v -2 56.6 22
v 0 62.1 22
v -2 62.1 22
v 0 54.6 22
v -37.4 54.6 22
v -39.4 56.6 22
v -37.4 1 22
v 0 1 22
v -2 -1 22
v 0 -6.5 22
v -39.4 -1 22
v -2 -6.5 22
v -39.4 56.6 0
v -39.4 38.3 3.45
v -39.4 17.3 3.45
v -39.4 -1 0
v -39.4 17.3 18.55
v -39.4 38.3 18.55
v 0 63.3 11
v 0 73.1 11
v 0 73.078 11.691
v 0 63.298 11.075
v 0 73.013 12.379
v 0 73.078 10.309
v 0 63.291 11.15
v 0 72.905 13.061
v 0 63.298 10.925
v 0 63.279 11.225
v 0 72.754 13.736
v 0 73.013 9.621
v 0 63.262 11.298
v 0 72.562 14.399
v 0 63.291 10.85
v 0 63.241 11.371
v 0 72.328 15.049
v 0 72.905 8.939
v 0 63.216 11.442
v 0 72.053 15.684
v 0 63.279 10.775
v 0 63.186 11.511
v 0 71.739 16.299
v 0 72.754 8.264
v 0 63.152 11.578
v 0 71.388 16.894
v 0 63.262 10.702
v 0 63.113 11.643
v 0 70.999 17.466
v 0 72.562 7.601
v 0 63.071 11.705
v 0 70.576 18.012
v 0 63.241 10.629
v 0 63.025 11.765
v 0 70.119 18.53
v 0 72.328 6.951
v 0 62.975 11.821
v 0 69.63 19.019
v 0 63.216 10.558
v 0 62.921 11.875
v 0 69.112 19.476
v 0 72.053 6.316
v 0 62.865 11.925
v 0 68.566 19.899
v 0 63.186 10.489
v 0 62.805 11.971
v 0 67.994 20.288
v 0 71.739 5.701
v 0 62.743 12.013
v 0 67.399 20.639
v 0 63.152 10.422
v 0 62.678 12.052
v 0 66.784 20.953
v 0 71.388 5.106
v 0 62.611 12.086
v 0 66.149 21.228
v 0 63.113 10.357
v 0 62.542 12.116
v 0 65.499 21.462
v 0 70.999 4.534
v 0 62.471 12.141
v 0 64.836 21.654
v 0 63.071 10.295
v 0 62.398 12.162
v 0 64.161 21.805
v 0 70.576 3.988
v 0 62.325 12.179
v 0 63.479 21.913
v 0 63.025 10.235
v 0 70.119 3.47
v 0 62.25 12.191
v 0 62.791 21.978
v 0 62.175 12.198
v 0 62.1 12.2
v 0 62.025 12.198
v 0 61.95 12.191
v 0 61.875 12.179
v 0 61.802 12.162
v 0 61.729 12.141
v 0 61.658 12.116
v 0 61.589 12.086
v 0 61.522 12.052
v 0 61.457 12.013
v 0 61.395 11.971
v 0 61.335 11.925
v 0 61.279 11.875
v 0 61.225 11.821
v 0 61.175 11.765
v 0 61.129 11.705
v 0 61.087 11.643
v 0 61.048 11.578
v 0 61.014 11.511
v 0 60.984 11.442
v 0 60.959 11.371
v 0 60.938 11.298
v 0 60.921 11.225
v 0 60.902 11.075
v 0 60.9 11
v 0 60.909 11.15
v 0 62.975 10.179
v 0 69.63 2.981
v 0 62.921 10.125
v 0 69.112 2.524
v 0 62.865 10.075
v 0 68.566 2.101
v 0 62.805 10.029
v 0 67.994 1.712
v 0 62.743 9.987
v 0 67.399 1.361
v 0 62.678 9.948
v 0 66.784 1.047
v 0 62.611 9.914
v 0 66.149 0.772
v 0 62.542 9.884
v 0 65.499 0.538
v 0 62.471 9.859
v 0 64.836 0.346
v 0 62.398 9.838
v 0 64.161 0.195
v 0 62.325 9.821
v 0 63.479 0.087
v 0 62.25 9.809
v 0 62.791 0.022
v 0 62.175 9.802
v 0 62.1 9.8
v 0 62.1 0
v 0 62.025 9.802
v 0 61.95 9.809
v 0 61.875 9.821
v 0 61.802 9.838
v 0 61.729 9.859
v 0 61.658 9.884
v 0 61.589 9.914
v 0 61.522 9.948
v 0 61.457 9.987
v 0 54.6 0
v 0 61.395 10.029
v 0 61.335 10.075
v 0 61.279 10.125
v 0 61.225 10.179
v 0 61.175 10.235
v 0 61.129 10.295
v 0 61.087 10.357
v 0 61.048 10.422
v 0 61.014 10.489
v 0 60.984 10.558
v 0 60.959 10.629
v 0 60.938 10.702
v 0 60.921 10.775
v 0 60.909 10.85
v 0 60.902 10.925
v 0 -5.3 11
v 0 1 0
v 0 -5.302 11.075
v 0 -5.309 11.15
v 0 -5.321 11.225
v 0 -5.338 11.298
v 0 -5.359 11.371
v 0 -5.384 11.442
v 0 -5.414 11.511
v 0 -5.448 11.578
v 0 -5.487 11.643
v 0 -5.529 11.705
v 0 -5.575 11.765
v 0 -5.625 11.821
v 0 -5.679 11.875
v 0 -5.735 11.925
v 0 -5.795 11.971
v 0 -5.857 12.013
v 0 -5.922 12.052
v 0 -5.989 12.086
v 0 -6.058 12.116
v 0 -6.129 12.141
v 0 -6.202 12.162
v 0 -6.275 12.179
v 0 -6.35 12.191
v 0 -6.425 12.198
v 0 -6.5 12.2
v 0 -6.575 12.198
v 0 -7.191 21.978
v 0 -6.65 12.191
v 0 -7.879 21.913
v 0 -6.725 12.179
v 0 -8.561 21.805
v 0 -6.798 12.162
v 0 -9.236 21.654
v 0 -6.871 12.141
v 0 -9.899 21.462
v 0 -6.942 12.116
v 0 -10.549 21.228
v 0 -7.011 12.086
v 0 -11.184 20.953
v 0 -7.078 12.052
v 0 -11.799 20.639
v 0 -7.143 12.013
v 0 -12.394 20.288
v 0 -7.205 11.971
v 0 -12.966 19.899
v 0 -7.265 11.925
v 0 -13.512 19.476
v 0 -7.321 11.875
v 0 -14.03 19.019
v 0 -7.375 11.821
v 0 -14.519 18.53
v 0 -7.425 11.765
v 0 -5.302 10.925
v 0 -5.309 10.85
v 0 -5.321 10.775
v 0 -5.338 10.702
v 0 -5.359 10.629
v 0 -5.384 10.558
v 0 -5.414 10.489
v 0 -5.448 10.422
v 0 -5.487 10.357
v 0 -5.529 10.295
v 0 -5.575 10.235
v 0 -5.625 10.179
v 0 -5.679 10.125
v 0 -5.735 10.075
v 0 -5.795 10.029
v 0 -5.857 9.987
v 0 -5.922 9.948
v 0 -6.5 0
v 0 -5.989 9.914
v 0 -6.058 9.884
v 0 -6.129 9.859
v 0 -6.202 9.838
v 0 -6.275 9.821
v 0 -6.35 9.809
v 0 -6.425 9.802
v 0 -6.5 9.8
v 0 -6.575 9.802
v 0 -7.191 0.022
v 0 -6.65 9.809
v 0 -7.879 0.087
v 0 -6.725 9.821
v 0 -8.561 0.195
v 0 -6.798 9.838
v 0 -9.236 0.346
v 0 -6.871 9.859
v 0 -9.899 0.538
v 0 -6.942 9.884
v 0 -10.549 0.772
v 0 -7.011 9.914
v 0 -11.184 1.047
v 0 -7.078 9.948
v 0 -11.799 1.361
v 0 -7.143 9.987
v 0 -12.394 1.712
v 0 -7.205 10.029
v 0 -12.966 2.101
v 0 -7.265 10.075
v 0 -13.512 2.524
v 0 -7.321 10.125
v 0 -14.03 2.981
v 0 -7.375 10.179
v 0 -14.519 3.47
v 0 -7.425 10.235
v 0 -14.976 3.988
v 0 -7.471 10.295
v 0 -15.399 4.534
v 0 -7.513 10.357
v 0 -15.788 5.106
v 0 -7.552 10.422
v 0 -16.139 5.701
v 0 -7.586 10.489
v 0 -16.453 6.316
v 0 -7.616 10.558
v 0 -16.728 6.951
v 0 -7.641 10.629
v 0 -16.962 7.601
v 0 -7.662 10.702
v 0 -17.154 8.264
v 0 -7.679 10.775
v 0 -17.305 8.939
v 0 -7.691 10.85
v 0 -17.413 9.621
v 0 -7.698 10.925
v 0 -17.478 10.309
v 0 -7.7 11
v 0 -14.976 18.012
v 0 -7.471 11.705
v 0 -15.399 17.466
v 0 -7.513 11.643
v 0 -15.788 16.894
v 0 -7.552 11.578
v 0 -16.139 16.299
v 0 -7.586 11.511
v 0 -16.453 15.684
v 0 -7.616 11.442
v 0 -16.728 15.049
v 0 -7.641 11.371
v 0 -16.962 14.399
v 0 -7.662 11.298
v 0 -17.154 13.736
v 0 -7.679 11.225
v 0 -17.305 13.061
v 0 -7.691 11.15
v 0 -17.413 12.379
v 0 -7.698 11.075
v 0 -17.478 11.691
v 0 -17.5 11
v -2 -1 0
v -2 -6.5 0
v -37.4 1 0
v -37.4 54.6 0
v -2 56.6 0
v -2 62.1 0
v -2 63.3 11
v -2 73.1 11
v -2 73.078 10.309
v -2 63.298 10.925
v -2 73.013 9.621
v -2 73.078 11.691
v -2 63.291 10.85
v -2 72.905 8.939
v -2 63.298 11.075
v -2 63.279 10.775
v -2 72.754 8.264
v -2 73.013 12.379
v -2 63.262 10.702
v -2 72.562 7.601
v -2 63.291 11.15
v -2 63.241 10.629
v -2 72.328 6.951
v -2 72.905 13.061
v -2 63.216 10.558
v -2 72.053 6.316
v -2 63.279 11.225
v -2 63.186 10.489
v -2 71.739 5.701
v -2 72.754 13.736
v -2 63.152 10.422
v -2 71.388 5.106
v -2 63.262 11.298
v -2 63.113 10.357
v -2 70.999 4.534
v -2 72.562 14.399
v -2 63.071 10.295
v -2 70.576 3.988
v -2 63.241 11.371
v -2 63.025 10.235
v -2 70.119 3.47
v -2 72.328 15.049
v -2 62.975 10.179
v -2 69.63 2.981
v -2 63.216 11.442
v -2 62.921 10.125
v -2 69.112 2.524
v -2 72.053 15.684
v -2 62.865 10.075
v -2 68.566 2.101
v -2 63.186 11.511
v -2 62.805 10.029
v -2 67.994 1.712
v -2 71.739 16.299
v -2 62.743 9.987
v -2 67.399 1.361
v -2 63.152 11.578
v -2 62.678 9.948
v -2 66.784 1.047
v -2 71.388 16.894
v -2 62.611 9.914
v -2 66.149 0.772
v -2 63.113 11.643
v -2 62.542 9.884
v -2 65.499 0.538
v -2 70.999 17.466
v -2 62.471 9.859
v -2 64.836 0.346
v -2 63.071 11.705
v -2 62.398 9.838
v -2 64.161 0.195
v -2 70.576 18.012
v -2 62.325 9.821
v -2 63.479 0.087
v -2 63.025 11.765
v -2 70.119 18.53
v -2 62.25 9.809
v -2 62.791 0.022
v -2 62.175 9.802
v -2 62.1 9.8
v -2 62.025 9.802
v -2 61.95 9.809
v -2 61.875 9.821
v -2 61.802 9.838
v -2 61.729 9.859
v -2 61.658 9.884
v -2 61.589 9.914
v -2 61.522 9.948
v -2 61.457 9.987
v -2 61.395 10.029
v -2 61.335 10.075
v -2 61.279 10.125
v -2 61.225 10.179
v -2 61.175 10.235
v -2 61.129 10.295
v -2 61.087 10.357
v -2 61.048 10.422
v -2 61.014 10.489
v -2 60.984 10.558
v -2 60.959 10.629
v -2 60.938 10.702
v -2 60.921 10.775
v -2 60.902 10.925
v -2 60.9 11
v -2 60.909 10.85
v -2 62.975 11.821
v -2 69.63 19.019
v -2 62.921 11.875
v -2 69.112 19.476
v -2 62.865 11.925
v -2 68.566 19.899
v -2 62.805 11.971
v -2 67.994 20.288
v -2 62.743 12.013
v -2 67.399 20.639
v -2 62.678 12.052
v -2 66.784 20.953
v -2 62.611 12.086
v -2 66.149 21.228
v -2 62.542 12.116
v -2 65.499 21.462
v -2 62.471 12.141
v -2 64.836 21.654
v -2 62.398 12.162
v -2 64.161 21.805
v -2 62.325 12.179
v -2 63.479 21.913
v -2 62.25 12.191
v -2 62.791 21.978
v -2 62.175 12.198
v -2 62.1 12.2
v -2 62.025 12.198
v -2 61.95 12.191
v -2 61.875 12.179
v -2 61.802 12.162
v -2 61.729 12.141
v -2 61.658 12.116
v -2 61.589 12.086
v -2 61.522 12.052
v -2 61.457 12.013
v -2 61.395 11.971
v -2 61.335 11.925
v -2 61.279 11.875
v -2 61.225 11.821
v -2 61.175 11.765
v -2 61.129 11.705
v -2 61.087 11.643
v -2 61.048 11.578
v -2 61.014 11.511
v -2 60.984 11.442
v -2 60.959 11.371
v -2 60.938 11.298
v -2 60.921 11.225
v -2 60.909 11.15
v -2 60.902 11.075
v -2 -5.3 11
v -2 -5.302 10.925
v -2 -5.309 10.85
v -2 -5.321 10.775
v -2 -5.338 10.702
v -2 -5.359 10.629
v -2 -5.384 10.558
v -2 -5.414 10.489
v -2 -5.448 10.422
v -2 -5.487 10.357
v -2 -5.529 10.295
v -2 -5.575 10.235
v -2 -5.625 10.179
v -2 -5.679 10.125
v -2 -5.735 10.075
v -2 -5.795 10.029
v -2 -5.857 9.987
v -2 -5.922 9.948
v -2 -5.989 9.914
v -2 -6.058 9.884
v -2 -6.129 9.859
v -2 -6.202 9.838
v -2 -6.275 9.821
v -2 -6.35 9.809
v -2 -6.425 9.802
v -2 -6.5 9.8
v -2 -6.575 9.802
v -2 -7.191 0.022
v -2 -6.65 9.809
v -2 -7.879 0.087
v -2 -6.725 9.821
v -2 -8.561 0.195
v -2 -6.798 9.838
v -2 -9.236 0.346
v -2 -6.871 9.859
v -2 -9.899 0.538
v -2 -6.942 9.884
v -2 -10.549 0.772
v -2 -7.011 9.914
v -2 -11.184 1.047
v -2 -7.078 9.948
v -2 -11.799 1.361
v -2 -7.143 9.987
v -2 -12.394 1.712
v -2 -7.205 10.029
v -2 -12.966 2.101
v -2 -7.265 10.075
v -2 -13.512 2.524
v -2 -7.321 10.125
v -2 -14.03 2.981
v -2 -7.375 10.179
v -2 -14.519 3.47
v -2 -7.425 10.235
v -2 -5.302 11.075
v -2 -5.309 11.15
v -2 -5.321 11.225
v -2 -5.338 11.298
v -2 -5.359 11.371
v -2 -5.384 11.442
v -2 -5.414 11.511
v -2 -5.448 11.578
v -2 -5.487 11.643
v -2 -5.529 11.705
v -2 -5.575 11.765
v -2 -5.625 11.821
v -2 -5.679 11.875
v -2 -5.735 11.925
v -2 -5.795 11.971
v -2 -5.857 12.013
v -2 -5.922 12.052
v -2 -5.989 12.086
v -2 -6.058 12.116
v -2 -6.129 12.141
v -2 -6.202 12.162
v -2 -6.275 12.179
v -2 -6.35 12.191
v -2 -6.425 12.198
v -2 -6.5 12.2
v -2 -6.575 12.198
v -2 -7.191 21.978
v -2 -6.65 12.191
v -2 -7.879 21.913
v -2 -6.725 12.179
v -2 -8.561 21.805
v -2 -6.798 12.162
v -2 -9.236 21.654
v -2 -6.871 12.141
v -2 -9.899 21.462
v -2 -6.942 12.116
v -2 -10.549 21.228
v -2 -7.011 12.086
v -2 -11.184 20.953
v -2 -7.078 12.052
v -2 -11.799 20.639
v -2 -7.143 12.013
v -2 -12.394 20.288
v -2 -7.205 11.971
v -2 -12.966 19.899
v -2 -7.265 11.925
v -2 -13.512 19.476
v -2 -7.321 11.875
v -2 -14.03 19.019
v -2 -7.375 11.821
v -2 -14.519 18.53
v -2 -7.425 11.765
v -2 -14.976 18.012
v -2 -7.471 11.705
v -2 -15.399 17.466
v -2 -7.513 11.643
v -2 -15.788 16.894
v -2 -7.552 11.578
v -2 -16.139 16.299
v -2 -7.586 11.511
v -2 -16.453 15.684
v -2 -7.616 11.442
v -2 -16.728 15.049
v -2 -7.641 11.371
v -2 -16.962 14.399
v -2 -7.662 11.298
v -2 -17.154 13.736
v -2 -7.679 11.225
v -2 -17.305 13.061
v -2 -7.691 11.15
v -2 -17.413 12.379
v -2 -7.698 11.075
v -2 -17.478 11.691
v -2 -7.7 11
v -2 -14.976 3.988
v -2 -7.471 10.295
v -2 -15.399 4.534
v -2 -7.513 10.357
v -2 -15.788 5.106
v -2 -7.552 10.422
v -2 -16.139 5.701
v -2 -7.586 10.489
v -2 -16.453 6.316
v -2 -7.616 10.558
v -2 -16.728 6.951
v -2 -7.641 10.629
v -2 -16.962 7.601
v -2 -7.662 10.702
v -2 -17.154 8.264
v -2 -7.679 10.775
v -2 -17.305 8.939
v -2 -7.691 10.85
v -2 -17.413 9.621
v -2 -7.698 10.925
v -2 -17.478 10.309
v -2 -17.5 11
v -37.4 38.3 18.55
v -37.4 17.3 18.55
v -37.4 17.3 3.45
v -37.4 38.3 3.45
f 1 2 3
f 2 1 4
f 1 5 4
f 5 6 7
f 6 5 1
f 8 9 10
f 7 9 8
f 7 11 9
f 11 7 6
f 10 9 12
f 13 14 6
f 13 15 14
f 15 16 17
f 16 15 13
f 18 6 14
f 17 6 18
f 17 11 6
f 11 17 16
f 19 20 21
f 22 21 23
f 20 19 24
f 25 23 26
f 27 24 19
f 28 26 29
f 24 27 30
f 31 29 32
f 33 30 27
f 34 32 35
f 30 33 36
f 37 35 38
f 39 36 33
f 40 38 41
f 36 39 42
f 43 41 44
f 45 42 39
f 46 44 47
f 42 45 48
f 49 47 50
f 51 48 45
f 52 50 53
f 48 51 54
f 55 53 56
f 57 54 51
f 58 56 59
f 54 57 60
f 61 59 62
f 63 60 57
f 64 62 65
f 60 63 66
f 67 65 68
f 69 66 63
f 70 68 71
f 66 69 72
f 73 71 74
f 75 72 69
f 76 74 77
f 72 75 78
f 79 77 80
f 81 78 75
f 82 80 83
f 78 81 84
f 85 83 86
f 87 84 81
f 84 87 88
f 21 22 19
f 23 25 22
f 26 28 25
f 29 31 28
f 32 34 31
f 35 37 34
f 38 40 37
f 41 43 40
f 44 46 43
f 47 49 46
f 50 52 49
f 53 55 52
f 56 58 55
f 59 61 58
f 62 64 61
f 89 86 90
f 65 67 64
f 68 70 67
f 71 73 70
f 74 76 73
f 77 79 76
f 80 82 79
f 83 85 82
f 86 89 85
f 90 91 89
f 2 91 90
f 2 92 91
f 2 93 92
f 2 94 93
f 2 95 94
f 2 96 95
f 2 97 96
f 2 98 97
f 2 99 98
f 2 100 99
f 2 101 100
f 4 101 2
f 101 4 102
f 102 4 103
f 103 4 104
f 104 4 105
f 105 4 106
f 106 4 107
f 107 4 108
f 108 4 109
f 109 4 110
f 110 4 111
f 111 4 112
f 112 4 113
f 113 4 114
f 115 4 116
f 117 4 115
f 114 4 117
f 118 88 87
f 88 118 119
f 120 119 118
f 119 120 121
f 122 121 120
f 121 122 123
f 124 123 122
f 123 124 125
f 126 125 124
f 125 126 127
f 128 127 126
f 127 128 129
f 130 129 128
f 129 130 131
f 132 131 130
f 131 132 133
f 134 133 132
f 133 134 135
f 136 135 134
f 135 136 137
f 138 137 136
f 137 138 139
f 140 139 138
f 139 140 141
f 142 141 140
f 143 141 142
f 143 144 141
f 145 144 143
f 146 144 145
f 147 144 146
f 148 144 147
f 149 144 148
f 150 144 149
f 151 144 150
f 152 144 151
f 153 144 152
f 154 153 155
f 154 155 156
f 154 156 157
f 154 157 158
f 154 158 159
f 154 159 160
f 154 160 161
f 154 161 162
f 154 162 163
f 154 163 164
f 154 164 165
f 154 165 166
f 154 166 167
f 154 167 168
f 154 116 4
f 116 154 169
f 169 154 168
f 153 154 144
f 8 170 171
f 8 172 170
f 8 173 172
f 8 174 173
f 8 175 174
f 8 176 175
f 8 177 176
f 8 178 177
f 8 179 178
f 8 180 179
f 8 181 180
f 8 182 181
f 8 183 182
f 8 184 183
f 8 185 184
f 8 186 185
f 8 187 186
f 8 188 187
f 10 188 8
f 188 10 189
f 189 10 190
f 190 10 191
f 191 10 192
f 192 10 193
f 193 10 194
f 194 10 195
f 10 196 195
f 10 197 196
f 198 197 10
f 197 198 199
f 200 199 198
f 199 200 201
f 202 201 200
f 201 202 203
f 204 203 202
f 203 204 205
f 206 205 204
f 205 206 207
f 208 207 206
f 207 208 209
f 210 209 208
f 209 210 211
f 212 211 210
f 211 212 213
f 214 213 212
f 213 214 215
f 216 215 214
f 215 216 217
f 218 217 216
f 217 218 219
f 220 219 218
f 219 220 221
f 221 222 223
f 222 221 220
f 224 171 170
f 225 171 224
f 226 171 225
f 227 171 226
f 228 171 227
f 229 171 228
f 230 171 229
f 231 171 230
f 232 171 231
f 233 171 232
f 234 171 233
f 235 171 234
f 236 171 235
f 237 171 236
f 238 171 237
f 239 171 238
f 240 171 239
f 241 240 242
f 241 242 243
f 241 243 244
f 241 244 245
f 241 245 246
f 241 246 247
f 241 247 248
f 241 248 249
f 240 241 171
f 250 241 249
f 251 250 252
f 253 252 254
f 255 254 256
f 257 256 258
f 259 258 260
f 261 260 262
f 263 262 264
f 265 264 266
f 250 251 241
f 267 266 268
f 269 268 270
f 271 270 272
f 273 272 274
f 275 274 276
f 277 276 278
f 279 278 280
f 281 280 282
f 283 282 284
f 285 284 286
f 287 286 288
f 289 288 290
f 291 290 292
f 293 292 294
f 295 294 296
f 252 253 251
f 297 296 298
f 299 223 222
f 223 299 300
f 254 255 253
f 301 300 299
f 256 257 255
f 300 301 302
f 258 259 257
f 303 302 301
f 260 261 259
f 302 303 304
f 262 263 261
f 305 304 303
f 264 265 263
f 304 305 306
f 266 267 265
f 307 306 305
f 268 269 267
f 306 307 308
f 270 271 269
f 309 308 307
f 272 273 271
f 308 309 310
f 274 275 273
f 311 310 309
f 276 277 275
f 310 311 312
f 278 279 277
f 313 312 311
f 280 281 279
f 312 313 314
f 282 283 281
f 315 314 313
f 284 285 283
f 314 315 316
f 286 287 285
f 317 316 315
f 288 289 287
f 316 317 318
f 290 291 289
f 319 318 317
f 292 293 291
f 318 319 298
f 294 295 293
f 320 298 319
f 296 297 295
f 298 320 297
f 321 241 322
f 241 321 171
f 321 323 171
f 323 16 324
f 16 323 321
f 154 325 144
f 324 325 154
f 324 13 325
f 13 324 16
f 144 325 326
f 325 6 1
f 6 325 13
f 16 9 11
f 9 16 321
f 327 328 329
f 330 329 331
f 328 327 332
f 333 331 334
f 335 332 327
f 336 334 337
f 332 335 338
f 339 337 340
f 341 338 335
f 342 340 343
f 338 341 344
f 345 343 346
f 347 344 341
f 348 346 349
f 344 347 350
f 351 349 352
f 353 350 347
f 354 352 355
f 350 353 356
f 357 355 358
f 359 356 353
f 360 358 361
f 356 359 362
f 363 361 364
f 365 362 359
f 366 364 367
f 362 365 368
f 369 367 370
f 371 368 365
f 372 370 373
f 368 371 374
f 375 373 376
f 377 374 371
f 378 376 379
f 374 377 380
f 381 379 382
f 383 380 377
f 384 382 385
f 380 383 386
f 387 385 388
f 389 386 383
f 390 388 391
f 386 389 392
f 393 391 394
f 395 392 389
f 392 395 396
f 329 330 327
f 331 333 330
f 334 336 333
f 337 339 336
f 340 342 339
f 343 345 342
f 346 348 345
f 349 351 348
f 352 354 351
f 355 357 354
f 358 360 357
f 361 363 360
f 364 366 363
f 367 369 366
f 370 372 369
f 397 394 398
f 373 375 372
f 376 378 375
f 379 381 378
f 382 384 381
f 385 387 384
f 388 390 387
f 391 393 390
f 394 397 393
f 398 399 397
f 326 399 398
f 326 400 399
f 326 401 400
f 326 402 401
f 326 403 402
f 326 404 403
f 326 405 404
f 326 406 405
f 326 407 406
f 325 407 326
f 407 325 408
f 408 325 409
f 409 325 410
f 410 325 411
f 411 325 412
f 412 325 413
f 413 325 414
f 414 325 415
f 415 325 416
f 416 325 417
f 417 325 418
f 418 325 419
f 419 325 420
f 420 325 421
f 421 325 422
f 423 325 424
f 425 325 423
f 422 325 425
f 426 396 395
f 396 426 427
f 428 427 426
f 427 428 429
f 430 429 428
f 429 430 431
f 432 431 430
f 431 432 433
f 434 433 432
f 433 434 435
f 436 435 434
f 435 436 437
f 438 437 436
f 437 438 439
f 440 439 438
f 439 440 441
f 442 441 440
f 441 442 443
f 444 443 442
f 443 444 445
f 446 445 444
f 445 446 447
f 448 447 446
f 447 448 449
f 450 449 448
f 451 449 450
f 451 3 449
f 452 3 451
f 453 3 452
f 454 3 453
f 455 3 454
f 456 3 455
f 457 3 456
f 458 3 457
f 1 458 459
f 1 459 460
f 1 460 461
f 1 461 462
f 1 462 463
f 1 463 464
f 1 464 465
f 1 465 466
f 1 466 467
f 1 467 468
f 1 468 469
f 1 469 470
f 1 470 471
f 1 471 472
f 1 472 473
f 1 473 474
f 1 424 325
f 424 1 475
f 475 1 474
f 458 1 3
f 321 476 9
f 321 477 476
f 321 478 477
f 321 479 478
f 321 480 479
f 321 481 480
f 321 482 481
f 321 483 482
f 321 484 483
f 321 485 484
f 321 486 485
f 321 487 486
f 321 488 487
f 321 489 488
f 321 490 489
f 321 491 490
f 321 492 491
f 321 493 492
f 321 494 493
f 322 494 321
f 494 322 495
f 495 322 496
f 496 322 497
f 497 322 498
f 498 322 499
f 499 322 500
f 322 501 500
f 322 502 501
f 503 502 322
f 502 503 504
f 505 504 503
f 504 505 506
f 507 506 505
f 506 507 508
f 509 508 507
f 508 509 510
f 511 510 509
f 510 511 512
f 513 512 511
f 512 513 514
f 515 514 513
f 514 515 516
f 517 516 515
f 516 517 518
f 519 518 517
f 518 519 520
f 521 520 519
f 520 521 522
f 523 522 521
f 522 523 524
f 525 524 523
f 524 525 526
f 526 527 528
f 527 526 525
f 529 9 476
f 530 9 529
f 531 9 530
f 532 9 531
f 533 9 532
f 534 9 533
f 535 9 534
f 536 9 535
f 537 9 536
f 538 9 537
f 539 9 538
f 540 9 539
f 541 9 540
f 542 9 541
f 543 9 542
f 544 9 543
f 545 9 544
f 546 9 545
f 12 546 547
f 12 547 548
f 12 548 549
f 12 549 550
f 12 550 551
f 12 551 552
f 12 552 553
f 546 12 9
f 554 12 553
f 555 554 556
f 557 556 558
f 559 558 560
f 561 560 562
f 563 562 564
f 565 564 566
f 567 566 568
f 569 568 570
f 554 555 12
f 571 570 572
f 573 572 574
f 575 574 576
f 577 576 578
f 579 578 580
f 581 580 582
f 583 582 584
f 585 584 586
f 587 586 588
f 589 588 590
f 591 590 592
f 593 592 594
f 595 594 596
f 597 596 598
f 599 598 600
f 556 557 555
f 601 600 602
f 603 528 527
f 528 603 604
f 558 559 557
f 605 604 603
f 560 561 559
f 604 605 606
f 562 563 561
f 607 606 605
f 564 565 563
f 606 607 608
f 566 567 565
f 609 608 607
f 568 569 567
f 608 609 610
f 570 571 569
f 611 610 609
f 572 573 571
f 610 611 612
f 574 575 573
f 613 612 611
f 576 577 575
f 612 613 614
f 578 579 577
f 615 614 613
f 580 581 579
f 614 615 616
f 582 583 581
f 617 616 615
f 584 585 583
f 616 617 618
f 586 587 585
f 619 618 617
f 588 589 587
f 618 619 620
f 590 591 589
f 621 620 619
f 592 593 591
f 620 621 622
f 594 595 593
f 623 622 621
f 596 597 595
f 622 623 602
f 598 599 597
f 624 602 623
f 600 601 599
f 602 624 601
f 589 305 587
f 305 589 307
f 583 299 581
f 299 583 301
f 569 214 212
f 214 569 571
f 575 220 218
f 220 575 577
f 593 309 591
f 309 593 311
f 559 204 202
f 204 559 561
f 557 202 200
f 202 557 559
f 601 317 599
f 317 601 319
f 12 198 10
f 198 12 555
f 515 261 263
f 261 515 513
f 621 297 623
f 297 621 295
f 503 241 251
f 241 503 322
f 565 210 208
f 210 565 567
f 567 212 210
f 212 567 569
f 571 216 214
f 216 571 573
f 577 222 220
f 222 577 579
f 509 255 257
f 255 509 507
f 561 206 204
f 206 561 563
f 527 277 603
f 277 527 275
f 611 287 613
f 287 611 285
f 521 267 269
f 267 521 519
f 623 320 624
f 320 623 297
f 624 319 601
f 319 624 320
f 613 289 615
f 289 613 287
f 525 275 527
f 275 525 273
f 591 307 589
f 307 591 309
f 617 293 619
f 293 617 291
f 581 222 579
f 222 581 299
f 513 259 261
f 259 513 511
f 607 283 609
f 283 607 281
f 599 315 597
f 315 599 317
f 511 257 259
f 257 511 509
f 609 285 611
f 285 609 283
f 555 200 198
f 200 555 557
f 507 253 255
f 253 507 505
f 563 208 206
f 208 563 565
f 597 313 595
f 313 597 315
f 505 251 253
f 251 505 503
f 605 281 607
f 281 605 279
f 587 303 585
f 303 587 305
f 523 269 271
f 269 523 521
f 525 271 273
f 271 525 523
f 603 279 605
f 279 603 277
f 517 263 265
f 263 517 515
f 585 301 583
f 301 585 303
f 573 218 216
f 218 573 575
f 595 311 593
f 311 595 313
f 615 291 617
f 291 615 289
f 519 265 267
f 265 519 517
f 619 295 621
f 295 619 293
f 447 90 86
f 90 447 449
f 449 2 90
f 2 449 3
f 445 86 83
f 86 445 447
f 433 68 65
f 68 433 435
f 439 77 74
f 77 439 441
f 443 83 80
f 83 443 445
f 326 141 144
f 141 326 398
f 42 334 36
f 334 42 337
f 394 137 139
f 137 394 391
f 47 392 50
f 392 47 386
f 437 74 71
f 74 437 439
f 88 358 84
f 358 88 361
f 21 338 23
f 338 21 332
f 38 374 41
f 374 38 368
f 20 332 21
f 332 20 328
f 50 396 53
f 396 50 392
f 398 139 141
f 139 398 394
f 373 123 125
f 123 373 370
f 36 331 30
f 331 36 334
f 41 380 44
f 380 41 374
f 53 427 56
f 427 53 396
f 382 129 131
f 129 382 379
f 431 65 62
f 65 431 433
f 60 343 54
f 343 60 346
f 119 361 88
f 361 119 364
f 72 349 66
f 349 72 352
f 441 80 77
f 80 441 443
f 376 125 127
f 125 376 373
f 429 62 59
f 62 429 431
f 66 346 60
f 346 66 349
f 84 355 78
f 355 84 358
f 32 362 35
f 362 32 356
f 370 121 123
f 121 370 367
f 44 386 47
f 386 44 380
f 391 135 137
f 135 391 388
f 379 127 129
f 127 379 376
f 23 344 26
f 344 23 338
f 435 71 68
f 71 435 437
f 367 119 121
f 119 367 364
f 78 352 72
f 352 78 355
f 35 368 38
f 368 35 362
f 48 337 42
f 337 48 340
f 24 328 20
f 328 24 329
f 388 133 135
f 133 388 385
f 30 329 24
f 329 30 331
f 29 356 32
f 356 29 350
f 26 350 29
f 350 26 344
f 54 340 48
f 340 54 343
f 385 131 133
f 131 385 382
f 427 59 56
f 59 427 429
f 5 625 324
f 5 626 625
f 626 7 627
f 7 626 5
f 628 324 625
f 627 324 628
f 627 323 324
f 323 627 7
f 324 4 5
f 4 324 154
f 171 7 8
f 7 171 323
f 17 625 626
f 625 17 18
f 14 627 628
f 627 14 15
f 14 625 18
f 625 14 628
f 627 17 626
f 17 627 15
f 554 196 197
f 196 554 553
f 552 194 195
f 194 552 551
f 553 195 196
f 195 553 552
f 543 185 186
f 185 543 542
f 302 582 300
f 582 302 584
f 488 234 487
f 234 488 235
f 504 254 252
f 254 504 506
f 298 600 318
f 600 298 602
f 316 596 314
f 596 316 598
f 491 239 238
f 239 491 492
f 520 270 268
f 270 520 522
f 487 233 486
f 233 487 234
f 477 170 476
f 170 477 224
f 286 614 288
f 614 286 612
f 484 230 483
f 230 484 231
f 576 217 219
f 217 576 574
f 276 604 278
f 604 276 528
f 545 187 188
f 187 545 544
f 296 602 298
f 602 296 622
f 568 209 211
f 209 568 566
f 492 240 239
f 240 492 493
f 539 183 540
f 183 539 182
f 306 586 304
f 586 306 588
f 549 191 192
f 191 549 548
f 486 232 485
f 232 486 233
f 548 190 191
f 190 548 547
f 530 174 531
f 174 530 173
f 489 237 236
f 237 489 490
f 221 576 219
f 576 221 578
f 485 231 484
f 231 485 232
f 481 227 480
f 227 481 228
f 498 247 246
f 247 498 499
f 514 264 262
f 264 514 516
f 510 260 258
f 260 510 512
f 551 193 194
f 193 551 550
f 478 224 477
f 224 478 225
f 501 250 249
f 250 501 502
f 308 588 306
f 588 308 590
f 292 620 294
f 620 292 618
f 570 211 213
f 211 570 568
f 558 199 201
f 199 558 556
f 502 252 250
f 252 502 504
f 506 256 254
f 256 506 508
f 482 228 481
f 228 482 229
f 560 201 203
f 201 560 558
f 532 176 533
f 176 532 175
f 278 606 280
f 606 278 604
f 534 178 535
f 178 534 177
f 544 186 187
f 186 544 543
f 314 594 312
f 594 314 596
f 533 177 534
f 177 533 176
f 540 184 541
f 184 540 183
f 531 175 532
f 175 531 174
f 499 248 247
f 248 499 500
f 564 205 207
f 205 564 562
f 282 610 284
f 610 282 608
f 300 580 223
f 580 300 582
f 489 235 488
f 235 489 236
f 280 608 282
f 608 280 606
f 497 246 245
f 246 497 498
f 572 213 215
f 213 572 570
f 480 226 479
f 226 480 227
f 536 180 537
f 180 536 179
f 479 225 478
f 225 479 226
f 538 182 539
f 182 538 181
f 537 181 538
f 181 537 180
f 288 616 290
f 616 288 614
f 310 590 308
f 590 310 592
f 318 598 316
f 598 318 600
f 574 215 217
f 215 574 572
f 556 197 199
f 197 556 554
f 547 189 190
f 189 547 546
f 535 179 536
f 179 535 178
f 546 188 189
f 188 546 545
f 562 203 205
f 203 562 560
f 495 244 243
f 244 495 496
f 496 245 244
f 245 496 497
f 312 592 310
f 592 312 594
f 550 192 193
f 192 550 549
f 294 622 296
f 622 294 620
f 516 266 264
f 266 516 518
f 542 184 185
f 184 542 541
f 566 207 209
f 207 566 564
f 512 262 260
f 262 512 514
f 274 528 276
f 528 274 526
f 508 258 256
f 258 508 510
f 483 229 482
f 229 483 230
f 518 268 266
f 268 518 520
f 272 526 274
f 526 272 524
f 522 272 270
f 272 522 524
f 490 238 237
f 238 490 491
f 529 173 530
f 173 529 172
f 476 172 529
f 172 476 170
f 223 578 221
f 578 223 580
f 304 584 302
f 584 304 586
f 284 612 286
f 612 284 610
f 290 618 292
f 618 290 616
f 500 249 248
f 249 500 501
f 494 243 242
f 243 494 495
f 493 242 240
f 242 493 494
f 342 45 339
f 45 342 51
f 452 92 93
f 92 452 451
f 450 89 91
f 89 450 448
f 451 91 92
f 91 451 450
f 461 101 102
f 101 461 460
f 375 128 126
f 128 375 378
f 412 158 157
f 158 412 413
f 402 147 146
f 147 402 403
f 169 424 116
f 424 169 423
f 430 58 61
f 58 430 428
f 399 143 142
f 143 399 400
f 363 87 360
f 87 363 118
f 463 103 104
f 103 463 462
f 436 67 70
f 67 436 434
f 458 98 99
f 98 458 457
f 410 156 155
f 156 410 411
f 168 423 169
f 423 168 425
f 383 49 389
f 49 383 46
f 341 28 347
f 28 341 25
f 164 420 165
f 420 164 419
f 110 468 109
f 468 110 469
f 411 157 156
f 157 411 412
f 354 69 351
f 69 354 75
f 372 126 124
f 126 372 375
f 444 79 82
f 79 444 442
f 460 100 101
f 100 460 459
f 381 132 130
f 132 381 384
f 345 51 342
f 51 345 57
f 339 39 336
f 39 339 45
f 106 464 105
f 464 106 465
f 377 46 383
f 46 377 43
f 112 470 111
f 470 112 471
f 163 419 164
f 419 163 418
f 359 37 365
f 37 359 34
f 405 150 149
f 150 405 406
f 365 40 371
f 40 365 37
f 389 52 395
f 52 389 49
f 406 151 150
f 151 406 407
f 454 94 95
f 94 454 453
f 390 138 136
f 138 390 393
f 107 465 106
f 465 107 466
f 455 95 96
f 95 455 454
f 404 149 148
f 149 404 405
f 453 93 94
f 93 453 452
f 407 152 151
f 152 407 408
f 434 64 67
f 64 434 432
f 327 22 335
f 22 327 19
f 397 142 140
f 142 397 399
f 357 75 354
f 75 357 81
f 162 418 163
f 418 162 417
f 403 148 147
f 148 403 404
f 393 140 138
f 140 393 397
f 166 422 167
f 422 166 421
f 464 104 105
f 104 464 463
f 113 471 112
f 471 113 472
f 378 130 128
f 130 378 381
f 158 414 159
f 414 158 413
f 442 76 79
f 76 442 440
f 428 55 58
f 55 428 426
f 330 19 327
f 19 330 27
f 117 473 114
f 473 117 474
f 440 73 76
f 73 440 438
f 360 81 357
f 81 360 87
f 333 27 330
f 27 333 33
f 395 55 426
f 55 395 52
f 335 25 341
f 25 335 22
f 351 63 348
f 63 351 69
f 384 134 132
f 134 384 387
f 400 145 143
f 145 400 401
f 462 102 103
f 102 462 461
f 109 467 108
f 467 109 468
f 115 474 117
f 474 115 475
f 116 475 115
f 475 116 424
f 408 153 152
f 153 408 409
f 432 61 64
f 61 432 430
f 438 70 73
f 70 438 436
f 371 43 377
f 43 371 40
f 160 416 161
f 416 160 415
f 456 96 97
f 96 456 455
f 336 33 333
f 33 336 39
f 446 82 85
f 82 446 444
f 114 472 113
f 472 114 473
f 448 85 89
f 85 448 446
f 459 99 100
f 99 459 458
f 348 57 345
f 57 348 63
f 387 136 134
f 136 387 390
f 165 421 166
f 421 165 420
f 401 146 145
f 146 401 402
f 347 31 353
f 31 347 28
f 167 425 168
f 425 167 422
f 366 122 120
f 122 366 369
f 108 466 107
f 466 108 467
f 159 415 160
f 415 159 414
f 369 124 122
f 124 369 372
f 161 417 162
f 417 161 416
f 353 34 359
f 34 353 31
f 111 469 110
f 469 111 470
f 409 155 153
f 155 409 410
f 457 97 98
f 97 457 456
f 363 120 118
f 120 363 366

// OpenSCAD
// Created by Simon Brüchner - public domain


// Inner dimensions
LENGTH        = 53.6;
WIDTH         = 22;
HEIGHT        = 37.4;


// Botton hole at the top
BUTTON_LENGTH = 21.0;
BUTTON_WIDTH  = 15.1;

// Screw diameter
SCREWHOLE     = 2;

WALL          = 2;
SPAN          = WIDTH / 4;



rotate([0,-90,0]) {
	difference() {
		union() {
	      color("yellow") translate([0,-WALL/2,0])  cube([WIDTH, LENGTH+(2*WALL), HEIGHT+WALL]);
			color("pink") translate([0,-SPAN-WALL/2,0]) cube([WIDTH, LENGTH+(2*(WALL+SPAN)), WALL]);
			color("green") translate([WIDTH/2,-WALL/2-SPAN,0]) cylinder(r=WIDTH/2, h=WALL);
			color("gray") translate([WIDTH/2,LENGTH+SPAN+WALL+WALL/2,0]) cylinder(r=WIDTH/2, h=WALL);
		}
		union() {
			color("red")  translate([-1,WALL/2,-1]) cube([WIDTH+2, LENGTH, HEIGHT+1]);
			color("blue") translate([(WIDTH / 2) - (BUTTON_WIDTH / 2), (LENGTH / 2) - (BUTTON_LENGTH / 2)+WALL/2, HEIGHT -1]) cube([BUTTON_WIDTH, BUTTON_LENGTH, WALL+2]);
	
			translate([WIDTH/2,-WALL/2-SPAN,-1]) cylinder(r=SCREWHOLE/2+0.2, h=WALL+2);	translate([WIDTH/2,LENGTH+SPAN+(1*WALL)+WALL/2,-1]) cylinder(r=SCREWHOLE/2+0.2, h=WALL+2);
		}
	}
}

$fn=100; 
